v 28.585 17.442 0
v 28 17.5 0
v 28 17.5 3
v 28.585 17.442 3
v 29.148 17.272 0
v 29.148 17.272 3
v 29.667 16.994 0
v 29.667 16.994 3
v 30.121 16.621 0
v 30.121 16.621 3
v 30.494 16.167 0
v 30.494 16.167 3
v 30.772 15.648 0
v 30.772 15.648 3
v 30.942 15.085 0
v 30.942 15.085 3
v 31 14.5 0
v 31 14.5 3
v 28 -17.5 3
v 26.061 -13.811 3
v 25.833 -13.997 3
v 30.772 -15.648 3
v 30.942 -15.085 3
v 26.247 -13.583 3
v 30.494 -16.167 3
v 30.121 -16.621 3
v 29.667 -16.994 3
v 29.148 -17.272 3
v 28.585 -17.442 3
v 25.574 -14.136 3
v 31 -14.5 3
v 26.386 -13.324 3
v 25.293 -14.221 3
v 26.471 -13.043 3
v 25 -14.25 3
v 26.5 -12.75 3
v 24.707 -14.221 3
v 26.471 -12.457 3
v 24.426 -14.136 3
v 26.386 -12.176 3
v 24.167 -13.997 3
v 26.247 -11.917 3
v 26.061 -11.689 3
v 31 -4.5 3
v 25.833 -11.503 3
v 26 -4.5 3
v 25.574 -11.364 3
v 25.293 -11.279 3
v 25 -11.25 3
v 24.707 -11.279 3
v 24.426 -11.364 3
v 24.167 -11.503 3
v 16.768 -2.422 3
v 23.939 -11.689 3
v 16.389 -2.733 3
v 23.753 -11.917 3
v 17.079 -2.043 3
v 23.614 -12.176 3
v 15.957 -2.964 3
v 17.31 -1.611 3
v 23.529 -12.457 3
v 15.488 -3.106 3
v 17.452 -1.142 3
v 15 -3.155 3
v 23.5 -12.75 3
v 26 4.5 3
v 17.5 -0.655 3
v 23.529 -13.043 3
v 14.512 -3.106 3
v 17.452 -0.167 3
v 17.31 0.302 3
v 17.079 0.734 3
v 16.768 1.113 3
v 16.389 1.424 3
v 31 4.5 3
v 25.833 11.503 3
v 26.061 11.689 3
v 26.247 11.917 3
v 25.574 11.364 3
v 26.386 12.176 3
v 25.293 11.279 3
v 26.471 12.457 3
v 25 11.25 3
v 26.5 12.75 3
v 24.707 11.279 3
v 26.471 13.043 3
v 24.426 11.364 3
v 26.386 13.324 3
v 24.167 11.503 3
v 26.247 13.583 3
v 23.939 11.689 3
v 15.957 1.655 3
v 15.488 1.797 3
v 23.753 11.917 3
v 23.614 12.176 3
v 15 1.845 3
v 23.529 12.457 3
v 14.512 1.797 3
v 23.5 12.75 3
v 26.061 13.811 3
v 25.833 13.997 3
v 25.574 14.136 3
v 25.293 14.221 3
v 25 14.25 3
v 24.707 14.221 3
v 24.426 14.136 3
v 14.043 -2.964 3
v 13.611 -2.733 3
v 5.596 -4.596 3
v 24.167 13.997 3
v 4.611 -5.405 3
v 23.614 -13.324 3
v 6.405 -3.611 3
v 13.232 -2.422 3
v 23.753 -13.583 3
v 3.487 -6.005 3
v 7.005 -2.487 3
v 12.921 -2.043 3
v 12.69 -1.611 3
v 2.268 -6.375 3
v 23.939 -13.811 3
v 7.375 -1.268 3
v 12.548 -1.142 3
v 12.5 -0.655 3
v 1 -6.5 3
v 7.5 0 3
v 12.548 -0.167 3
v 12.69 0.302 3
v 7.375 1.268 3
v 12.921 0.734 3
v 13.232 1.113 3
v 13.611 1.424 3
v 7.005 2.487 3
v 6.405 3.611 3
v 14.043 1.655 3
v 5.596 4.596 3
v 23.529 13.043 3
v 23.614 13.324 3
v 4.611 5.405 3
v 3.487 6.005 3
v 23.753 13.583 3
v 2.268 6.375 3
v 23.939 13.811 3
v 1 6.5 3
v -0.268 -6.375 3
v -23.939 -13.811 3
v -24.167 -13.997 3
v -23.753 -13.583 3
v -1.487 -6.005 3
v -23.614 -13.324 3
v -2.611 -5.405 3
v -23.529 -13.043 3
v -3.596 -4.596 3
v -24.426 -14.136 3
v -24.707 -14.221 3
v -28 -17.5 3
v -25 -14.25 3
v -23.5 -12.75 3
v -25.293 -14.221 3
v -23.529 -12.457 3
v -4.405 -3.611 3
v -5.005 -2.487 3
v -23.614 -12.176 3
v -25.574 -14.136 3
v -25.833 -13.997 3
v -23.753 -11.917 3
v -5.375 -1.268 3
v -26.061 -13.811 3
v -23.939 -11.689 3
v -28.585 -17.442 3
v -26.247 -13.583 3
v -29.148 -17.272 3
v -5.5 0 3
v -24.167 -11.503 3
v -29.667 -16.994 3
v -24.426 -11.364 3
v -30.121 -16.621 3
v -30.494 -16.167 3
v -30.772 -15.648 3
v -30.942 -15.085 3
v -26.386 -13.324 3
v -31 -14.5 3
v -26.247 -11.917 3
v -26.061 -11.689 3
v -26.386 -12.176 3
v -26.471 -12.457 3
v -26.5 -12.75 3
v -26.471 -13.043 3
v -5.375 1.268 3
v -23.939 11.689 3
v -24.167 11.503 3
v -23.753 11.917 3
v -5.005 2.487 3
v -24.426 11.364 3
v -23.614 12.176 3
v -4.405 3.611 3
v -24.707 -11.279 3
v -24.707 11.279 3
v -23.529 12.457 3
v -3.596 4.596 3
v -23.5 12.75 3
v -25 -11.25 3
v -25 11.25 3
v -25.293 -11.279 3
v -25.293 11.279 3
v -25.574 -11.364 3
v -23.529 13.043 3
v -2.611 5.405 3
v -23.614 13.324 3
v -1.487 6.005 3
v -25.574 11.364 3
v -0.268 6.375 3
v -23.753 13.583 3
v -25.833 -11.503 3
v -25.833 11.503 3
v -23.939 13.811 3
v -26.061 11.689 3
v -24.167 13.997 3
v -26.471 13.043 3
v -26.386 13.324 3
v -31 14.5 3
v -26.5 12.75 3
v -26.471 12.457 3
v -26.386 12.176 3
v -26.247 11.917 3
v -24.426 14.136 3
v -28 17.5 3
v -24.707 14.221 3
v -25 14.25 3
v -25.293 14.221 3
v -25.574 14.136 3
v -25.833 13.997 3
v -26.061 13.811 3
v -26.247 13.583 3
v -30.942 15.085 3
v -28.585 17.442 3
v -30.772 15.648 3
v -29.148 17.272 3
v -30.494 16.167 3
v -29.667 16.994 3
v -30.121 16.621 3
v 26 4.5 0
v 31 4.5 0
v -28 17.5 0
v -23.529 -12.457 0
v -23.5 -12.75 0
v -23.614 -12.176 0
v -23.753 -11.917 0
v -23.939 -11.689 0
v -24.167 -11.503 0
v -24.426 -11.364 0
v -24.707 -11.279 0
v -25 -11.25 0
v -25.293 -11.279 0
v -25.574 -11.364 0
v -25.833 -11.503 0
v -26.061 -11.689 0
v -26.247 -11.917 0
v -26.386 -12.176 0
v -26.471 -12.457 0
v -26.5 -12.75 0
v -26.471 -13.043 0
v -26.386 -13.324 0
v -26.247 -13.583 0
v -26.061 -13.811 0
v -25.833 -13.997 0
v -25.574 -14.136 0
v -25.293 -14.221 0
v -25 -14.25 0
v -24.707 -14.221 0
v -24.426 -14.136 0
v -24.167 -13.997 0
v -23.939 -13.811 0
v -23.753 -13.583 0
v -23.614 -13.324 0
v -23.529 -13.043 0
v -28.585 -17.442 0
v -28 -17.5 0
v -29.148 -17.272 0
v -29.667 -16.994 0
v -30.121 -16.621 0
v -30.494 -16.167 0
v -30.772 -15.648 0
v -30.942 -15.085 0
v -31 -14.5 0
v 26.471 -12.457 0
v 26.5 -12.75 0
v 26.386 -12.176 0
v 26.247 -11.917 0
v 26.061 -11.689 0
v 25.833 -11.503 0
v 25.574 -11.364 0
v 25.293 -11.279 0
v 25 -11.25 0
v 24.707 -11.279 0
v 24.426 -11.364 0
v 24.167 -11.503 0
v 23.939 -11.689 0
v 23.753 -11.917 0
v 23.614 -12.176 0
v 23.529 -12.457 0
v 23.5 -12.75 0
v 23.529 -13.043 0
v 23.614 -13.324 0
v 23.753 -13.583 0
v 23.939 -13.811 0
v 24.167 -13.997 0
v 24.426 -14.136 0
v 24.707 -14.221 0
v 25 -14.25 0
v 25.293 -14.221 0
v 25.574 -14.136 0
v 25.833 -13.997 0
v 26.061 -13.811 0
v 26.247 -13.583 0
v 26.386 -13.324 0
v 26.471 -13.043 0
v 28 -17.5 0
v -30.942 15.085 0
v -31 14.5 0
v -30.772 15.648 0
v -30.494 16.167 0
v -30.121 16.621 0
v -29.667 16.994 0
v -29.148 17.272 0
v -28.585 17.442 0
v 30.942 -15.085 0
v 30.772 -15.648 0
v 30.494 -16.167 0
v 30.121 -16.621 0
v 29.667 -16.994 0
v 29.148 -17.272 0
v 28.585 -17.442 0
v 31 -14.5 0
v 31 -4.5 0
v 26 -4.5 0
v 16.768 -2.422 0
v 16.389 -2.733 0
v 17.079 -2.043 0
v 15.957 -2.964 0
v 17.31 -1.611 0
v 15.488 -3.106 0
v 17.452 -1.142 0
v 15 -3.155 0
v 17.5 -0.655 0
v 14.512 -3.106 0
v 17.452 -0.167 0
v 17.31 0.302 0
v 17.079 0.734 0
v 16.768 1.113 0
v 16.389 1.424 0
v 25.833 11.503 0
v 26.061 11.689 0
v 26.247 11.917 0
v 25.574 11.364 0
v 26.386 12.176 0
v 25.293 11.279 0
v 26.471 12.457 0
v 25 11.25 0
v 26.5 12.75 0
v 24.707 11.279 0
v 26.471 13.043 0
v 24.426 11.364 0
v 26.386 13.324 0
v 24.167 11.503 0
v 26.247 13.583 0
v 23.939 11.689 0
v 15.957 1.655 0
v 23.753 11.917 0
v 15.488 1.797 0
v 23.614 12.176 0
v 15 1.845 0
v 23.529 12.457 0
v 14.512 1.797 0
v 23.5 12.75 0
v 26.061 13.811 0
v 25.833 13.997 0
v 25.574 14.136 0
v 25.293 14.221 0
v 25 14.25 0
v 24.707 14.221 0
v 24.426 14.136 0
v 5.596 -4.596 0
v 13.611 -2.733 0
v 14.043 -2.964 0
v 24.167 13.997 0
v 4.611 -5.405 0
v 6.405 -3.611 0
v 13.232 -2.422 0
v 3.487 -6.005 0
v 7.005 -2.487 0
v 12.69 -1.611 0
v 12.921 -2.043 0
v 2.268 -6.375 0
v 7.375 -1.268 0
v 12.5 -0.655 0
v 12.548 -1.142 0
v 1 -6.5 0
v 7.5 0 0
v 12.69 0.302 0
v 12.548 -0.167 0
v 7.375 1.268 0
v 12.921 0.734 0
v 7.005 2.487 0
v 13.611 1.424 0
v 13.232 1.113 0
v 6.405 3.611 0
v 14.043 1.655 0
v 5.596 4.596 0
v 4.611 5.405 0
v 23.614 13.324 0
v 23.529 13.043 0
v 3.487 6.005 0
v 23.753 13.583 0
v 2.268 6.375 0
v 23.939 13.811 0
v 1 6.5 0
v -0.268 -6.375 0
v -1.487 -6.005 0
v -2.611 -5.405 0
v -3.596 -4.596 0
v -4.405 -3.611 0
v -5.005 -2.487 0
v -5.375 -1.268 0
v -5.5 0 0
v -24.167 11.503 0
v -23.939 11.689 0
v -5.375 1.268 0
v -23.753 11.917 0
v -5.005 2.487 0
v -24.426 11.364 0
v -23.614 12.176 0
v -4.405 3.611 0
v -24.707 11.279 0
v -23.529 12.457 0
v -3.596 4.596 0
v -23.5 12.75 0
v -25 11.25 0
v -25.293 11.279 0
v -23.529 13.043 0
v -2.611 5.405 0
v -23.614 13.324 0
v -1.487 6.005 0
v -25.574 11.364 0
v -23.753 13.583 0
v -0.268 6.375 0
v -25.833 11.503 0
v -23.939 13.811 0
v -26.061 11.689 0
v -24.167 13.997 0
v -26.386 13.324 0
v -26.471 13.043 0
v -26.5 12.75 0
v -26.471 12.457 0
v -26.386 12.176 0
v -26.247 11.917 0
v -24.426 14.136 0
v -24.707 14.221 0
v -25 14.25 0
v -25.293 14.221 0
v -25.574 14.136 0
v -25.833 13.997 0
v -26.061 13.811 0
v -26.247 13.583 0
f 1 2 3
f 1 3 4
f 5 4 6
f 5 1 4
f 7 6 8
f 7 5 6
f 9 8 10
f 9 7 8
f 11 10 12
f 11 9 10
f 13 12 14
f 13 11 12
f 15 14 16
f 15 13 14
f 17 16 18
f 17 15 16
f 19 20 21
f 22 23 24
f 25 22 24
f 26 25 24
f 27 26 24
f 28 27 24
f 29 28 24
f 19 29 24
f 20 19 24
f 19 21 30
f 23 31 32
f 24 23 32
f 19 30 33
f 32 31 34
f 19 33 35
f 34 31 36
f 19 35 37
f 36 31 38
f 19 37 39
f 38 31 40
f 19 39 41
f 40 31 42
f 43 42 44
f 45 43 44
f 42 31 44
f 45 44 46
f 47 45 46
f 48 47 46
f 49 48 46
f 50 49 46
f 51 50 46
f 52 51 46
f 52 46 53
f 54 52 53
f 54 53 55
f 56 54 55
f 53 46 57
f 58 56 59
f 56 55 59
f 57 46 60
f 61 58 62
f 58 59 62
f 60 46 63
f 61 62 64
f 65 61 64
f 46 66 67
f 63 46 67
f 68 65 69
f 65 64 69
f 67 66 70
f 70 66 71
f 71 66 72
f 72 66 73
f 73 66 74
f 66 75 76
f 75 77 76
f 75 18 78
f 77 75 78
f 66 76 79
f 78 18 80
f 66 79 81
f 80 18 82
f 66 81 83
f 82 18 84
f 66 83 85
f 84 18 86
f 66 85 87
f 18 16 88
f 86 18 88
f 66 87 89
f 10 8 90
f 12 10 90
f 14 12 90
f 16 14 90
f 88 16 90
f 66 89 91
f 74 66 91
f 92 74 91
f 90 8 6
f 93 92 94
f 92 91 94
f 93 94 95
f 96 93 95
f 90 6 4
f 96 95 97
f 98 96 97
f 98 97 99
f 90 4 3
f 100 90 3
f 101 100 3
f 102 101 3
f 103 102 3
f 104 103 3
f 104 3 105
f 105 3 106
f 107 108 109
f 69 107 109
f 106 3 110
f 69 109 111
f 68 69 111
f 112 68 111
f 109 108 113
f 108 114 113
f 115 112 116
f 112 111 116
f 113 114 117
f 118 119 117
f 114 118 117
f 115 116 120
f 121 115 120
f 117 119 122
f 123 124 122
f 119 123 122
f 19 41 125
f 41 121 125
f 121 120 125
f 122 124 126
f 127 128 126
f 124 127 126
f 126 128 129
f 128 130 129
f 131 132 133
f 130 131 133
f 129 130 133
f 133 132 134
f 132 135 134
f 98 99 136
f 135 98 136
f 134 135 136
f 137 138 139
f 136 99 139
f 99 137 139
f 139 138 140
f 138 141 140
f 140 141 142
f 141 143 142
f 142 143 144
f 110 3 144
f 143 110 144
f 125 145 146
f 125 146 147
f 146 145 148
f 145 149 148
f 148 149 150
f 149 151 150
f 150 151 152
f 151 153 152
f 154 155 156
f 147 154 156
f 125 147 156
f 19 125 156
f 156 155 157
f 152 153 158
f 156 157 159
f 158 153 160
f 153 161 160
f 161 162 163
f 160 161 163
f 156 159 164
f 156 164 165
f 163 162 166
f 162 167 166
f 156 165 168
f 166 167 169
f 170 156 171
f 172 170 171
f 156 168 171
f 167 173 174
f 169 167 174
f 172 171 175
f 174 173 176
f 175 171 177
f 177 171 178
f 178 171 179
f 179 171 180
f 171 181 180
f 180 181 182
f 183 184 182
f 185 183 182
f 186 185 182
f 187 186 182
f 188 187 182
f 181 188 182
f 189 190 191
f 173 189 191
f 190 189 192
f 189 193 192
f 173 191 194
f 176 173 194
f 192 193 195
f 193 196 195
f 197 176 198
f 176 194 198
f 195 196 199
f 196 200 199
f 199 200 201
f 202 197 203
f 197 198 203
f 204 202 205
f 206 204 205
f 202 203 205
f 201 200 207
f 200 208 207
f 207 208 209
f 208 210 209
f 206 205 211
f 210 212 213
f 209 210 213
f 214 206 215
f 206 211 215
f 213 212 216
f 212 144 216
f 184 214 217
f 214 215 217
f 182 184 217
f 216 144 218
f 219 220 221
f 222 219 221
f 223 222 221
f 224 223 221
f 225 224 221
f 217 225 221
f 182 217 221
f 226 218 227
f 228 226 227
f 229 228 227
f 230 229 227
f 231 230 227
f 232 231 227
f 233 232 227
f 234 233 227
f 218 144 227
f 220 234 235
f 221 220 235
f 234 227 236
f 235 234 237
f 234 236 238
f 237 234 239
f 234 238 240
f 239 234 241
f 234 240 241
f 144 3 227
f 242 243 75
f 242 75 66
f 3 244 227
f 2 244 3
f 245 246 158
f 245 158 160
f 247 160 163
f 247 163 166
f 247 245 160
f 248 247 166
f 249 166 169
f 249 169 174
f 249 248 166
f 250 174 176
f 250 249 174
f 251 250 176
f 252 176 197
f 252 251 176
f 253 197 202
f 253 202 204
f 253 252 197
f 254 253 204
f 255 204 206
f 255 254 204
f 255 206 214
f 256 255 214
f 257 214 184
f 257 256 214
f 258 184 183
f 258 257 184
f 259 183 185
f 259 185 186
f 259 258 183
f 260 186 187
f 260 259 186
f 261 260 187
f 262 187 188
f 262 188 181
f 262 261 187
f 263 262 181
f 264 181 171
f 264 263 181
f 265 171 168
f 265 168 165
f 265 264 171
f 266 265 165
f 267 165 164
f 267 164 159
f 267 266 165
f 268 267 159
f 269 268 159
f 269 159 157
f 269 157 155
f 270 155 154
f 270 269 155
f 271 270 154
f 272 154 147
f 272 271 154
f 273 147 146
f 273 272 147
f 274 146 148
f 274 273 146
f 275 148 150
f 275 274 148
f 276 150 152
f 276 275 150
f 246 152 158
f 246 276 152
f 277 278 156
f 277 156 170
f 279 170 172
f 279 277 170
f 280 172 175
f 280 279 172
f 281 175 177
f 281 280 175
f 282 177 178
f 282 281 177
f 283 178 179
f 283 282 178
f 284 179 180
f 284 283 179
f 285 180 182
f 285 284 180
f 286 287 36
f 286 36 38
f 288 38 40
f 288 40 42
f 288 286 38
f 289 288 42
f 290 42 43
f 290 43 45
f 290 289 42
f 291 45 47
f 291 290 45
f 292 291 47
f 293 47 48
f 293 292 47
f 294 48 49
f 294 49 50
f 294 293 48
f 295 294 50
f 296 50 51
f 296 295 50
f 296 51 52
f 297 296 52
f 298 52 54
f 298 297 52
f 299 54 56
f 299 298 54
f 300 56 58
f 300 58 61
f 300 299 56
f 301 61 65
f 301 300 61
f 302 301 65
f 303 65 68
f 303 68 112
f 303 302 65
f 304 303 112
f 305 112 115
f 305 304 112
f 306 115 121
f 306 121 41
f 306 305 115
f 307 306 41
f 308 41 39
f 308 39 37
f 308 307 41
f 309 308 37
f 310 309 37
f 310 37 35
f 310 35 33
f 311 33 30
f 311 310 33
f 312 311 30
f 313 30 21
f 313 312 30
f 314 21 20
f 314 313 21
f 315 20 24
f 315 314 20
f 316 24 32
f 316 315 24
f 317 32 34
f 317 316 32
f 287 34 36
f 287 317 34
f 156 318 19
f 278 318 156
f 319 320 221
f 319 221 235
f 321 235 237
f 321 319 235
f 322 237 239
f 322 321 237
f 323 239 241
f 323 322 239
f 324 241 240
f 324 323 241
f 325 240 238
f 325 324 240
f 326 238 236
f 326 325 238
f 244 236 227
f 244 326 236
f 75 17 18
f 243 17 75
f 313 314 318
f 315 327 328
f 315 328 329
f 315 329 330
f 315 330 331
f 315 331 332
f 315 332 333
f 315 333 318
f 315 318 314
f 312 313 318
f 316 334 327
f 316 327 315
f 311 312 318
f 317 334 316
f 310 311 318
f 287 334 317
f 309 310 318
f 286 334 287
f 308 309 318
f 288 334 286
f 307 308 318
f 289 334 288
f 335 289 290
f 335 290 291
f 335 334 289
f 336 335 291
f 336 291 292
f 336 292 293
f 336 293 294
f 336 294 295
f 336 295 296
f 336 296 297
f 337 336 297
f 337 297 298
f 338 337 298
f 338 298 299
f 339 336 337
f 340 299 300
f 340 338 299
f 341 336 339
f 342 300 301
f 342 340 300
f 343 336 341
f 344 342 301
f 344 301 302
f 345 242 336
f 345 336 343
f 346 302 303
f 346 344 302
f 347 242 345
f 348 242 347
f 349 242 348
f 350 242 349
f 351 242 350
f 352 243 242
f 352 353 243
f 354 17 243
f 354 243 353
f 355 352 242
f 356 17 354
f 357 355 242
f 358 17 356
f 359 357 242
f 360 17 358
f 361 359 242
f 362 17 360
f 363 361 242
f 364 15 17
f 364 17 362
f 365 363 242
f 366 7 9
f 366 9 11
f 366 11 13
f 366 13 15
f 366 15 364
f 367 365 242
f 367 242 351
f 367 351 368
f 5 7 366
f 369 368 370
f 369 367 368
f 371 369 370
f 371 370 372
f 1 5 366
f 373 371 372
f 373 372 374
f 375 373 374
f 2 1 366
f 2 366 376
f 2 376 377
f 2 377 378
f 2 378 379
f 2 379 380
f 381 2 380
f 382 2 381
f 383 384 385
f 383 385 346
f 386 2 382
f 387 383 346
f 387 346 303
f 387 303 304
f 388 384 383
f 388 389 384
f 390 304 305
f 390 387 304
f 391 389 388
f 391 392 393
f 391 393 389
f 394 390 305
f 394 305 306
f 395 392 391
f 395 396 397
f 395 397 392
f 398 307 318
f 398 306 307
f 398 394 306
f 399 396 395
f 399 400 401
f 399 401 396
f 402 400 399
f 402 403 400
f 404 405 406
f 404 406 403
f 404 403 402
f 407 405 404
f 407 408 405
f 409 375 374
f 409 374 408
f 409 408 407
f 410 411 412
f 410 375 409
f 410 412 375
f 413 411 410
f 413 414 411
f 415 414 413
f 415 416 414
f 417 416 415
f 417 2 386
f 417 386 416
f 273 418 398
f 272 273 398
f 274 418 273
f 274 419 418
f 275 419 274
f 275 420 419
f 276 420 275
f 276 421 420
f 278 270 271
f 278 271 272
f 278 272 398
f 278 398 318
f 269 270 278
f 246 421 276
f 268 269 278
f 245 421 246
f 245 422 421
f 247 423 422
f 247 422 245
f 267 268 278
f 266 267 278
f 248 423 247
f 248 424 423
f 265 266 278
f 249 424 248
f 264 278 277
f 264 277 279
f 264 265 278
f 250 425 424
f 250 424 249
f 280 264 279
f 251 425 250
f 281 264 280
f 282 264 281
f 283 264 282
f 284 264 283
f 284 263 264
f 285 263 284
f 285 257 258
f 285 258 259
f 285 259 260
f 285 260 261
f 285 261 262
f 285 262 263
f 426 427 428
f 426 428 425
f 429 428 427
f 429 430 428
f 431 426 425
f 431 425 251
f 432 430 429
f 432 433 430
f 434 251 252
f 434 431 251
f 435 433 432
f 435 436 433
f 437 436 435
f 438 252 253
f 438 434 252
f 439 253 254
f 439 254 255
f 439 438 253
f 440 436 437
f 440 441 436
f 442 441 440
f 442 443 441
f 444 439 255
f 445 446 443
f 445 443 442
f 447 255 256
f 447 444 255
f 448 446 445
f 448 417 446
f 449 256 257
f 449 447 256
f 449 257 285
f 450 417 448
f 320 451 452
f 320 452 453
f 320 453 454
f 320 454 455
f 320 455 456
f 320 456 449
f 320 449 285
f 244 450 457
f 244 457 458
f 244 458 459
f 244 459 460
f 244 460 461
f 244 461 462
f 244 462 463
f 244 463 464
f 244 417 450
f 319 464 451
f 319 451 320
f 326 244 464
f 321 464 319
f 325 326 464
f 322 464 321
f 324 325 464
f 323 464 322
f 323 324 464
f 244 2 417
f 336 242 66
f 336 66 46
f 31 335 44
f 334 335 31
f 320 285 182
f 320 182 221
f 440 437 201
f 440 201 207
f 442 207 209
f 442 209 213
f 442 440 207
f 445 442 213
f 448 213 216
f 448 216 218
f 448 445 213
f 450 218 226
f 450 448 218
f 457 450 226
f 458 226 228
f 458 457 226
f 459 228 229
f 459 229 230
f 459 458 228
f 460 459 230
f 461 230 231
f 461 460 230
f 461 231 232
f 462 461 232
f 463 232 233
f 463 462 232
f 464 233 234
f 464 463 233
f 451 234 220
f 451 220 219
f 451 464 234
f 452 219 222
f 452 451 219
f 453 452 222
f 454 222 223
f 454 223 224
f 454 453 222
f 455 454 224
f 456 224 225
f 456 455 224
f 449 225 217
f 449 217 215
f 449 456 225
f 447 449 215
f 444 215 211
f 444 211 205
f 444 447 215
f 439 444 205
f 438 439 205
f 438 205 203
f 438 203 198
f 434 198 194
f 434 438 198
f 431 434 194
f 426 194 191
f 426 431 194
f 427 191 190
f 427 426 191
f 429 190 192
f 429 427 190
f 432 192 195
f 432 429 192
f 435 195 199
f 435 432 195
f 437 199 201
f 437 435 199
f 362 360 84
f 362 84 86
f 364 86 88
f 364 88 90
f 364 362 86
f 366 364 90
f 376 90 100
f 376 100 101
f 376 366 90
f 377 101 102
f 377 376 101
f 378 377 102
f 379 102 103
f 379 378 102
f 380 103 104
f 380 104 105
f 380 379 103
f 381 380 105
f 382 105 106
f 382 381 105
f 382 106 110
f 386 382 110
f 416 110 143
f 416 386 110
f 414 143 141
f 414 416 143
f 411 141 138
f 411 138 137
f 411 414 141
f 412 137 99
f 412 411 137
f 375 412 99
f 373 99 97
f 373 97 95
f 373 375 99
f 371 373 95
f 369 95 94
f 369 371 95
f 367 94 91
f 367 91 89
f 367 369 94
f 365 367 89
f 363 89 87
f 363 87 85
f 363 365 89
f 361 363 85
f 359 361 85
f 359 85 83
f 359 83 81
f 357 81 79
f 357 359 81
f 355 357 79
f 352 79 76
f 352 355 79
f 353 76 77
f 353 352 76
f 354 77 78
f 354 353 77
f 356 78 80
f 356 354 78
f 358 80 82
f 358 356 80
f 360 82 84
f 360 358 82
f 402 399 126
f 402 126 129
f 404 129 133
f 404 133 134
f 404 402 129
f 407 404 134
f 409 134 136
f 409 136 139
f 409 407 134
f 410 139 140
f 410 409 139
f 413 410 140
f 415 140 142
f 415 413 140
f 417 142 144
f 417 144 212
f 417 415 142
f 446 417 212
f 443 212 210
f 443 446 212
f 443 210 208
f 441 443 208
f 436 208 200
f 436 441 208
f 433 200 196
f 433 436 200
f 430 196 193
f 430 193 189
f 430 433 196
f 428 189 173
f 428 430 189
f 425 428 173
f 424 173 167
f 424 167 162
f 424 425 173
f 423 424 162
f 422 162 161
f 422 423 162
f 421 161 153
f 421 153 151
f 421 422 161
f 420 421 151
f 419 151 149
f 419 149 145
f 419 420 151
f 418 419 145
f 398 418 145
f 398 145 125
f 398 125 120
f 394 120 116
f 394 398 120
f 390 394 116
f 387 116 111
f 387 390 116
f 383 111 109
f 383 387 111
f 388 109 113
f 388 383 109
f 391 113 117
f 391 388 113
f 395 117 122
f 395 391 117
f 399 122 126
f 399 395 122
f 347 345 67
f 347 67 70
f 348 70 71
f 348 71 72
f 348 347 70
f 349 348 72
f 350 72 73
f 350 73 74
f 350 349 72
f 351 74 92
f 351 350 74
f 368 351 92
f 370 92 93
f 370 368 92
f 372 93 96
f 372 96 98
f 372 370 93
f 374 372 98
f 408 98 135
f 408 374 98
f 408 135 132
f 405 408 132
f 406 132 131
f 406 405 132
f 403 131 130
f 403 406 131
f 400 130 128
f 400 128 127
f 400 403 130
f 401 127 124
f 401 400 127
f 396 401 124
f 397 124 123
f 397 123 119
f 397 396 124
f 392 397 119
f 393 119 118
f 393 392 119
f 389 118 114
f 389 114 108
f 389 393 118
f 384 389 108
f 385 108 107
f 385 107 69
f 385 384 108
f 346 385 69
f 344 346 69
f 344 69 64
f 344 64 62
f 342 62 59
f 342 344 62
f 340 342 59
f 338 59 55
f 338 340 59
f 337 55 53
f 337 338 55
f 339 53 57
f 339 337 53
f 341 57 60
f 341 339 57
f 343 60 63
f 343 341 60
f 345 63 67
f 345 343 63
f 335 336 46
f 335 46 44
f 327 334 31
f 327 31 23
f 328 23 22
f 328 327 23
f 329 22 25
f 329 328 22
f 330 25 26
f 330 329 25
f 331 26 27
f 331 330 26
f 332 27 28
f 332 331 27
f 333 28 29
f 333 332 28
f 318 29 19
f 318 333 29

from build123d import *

# Parameters (mm, degrees)
SKETCH1_R           = 2.5
SKETCH1_R_2         = 6.5
SKETCH1_R_3         = 1.5
BOSS_EXTRUDE1_DEPTH = 3


with BuildPart() as part:
    # Sketch1 → Boss-Extrude1 (new body)
    with BuildSketch(Plane.XY):
        with BuildLine():
            Line((31, 4.5), (26, 4.5))
            Line((26, 4.5), (26, -4.5))
            Line((26, -4.5), (31, -4.5))
            Line((31, -4.5), (31, -14.5))
            ThreePointArc((31, -14.5), (30.121320344, -16.621320344), (28, -17.5))
            Line((28, -17.5), (-28, -17.5))
            ThreePointArc((-28, -17.5), (-30.121320344, -16.621320344), (-31, -14.5))
            Line((-31, -14.5), (-31, 14.5))
            ThreePointArc((-31, 14.5), (-30.121320344, 16.621320344), (-28, 17.5))
            Line((-28, 17.5), (28, 17.5))
            ThreePointArc((28, 17.5), (30.121320344, 16.621320344), (31, 14.5))
            Line((31, 14.5), (31, 4.5))
        make_face()
        with Locations((15, -0.654521384)):
            Circle(SKETCH1_R, mode=Mode.SUBTRACT)
        with Locations((1, 0)):
            Circle(SKETCH1_R_2, mode=Mode.SUBTRACT)
        with Locations((-25, 12.75)):
            Circle(SKETCH1_R_3, mode=Mode.SUBTRACT)
        with Locations((25, 12.75)):
            Circle(SKETCH1_R_3, mode=Mode.SUBTRACT)
        with Locations((25, -12.75)):
            Circle(SKETCH1_R_3, mode=Mode.SUBTRACT)
        with Locations((-25, -12.75)):
            Circle(SKETCH1_R_3, mode=Mode.SUBTRACT)
    extrude(amount=BOSS_EXTRUDE1_DEPTH)


solid = part.part
